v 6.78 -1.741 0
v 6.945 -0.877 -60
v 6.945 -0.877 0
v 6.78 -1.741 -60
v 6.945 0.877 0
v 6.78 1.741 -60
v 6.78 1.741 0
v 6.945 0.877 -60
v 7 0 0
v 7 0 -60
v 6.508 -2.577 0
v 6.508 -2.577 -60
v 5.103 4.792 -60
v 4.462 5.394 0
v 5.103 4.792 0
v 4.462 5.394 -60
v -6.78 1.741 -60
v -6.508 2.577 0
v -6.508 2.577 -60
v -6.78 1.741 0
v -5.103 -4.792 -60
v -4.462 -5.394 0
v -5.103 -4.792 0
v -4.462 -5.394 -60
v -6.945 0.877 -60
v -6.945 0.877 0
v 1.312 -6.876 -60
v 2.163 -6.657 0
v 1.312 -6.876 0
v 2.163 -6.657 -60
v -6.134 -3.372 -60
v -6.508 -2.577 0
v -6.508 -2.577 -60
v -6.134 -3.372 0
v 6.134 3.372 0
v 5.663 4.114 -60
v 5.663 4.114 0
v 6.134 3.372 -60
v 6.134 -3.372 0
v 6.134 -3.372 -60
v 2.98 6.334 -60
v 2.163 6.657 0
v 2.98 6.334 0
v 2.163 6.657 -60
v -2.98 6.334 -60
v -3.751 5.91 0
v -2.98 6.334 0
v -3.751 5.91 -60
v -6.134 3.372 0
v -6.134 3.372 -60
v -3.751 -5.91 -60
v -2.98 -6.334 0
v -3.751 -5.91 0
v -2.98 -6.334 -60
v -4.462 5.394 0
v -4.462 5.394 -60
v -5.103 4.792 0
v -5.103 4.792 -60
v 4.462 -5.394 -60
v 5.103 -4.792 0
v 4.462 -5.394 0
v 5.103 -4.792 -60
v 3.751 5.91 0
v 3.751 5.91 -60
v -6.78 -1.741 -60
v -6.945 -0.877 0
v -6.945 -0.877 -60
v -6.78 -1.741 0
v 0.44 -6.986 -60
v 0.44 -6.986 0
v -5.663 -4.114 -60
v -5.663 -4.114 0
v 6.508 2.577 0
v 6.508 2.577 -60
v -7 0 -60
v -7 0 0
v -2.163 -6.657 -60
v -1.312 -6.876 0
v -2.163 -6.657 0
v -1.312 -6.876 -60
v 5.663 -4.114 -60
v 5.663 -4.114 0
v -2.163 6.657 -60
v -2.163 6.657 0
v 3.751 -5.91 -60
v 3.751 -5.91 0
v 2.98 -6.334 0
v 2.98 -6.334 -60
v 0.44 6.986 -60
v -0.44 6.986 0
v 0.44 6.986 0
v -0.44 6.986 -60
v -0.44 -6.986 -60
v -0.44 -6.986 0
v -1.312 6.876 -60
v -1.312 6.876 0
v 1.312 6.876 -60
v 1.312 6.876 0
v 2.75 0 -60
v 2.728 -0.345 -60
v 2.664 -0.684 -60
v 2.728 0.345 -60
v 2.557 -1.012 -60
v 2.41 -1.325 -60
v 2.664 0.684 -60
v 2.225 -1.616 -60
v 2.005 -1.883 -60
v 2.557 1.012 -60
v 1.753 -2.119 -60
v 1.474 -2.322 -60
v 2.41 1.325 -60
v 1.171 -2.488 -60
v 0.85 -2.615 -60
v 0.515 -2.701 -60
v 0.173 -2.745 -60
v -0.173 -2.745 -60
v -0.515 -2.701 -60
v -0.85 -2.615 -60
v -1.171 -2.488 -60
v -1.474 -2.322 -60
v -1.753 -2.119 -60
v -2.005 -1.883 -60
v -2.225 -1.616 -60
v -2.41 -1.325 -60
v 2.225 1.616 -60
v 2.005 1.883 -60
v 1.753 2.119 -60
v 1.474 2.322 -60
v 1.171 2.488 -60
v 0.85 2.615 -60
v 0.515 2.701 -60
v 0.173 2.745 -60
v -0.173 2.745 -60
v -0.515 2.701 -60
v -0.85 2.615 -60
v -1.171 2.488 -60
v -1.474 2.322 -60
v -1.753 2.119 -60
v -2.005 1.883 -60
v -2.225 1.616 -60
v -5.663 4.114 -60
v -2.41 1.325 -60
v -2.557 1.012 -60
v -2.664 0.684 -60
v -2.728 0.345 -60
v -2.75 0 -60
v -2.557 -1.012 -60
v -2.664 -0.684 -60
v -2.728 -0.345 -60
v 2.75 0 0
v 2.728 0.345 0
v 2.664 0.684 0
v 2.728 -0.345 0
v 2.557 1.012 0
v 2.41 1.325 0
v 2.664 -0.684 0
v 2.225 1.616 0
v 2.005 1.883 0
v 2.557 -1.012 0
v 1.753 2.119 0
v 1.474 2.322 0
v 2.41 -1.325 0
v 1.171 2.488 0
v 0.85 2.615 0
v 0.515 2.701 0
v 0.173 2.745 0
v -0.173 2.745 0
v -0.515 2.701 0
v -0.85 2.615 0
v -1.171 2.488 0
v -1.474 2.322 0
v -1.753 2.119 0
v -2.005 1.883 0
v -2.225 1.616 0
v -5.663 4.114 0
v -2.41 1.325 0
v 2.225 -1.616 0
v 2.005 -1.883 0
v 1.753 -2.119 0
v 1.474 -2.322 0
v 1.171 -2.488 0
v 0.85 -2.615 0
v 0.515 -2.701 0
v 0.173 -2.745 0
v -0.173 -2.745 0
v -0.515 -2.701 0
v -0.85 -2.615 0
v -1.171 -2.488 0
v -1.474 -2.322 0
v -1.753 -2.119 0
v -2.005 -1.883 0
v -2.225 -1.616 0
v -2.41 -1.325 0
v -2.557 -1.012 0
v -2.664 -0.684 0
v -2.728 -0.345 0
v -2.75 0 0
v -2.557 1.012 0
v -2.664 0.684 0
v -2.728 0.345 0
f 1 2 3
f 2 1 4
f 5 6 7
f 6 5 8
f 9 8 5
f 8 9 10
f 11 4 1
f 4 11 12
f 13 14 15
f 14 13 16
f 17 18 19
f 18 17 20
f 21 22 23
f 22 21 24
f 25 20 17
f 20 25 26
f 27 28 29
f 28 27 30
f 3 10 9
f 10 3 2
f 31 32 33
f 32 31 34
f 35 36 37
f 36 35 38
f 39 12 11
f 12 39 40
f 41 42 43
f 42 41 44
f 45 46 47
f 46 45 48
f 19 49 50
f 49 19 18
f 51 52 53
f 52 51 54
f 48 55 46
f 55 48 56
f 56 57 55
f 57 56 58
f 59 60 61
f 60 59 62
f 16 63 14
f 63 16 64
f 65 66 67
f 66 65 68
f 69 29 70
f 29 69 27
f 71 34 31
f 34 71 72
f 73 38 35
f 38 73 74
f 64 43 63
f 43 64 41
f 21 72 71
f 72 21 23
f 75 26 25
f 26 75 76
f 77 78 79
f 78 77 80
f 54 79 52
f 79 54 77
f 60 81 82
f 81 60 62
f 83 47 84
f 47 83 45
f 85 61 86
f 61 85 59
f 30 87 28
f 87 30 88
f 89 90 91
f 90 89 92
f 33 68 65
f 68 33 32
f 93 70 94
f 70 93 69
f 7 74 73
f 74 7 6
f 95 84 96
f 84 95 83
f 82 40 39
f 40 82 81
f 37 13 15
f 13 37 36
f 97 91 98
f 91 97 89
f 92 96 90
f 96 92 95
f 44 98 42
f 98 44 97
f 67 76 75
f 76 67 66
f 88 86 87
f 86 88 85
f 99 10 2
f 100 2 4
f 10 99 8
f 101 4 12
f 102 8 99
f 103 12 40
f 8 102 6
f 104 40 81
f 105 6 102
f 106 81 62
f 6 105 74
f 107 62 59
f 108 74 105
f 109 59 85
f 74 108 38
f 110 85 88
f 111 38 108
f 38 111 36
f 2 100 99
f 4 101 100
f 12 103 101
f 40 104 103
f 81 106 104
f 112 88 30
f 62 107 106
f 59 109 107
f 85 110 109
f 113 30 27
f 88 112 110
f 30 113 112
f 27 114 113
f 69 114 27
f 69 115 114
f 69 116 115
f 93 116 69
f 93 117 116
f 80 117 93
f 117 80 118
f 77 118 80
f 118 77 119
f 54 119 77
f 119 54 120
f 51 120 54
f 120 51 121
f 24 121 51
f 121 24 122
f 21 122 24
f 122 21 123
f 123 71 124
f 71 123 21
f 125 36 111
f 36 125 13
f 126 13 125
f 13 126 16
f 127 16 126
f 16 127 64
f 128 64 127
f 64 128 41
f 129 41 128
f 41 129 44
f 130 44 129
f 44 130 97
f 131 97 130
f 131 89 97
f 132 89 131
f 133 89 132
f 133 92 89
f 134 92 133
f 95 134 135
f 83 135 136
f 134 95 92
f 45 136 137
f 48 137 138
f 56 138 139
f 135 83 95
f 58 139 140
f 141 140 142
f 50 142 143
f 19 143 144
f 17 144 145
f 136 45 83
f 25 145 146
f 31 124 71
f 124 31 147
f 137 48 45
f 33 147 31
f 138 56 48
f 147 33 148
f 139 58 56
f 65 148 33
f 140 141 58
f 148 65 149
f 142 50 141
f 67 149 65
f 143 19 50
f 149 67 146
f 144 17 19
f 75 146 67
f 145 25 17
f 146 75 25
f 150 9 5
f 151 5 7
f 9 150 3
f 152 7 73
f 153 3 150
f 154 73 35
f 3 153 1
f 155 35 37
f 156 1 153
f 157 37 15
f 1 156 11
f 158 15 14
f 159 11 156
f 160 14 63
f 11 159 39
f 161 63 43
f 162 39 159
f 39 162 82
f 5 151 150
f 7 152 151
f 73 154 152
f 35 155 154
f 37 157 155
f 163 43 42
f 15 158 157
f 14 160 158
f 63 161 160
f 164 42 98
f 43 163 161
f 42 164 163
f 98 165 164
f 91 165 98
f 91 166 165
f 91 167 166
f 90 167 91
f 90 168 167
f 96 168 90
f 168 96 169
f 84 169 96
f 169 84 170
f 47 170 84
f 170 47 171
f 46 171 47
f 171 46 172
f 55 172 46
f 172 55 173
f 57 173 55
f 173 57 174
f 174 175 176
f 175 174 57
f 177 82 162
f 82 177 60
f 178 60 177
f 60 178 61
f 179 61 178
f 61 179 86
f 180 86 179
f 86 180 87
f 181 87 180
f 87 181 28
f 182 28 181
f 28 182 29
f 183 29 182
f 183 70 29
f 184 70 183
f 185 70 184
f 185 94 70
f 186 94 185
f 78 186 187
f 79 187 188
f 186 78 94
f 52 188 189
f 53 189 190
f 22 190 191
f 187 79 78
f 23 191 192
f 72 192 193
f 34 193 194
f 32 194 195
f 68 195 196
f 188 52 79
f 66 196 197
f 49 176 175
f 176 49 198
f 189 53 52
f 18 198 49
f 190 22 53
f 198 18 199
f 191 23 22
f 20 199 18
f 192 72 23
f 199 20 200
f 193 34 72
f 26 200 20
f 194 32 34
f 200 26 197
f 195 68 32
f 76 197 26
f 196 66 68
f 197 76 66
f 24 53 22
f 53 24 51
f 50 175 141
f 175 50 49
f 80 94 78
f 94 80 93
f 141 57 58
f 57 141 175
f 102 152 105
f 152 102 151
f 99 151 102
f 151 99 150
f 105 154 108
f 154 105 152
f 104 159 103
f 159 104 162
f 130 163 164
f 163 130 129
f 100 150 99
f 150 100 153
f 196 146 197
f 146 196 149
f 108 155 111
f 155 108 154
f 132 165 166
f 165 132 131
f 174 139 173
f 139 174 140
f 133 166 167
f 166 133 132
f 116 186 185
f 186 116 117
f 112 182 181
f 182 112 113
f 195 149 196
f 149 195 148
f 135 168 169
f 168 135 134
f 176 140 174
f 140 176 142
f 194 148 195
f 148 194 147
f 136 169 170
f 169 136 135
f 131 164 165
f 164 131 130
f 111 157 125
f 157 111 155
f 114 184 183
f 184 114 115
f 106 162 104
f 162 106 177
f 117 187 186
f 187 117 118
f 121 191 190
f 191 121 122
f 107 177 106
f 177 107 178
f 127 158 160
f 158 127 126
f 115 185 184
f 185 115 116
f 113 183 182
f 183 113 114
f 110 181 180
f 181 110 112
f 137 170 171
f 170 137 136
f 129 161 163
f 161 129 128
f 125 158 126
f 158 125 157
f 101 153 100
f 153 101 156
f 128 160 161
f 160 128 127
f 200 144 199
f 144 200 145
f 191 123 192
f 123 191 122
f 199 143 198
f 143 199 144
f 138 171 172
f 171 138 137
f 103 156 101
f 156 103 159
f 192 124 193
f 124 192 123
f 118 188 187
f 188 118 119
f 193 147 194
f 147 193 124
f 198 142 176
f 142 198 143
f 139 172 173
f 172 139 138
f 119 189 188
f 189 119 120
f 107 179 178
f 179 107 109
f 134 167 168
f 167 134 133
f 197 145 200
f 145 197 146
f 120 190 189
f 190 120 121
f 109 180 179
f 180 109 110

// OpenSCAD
$fn = 50;


difference() {
	union() {
		translate(v = [0, 0, -60.0000000000]) {
			cylinder(h = 60, r = 7.0000000000);
		}
		cylinder(h = 0, r = 10.0000000000);
	}
	union() {
		#translate(v = [0, 0, -60]) {
			cylinder(h = 60, r = 2.7500000000);
		}
	}
}
